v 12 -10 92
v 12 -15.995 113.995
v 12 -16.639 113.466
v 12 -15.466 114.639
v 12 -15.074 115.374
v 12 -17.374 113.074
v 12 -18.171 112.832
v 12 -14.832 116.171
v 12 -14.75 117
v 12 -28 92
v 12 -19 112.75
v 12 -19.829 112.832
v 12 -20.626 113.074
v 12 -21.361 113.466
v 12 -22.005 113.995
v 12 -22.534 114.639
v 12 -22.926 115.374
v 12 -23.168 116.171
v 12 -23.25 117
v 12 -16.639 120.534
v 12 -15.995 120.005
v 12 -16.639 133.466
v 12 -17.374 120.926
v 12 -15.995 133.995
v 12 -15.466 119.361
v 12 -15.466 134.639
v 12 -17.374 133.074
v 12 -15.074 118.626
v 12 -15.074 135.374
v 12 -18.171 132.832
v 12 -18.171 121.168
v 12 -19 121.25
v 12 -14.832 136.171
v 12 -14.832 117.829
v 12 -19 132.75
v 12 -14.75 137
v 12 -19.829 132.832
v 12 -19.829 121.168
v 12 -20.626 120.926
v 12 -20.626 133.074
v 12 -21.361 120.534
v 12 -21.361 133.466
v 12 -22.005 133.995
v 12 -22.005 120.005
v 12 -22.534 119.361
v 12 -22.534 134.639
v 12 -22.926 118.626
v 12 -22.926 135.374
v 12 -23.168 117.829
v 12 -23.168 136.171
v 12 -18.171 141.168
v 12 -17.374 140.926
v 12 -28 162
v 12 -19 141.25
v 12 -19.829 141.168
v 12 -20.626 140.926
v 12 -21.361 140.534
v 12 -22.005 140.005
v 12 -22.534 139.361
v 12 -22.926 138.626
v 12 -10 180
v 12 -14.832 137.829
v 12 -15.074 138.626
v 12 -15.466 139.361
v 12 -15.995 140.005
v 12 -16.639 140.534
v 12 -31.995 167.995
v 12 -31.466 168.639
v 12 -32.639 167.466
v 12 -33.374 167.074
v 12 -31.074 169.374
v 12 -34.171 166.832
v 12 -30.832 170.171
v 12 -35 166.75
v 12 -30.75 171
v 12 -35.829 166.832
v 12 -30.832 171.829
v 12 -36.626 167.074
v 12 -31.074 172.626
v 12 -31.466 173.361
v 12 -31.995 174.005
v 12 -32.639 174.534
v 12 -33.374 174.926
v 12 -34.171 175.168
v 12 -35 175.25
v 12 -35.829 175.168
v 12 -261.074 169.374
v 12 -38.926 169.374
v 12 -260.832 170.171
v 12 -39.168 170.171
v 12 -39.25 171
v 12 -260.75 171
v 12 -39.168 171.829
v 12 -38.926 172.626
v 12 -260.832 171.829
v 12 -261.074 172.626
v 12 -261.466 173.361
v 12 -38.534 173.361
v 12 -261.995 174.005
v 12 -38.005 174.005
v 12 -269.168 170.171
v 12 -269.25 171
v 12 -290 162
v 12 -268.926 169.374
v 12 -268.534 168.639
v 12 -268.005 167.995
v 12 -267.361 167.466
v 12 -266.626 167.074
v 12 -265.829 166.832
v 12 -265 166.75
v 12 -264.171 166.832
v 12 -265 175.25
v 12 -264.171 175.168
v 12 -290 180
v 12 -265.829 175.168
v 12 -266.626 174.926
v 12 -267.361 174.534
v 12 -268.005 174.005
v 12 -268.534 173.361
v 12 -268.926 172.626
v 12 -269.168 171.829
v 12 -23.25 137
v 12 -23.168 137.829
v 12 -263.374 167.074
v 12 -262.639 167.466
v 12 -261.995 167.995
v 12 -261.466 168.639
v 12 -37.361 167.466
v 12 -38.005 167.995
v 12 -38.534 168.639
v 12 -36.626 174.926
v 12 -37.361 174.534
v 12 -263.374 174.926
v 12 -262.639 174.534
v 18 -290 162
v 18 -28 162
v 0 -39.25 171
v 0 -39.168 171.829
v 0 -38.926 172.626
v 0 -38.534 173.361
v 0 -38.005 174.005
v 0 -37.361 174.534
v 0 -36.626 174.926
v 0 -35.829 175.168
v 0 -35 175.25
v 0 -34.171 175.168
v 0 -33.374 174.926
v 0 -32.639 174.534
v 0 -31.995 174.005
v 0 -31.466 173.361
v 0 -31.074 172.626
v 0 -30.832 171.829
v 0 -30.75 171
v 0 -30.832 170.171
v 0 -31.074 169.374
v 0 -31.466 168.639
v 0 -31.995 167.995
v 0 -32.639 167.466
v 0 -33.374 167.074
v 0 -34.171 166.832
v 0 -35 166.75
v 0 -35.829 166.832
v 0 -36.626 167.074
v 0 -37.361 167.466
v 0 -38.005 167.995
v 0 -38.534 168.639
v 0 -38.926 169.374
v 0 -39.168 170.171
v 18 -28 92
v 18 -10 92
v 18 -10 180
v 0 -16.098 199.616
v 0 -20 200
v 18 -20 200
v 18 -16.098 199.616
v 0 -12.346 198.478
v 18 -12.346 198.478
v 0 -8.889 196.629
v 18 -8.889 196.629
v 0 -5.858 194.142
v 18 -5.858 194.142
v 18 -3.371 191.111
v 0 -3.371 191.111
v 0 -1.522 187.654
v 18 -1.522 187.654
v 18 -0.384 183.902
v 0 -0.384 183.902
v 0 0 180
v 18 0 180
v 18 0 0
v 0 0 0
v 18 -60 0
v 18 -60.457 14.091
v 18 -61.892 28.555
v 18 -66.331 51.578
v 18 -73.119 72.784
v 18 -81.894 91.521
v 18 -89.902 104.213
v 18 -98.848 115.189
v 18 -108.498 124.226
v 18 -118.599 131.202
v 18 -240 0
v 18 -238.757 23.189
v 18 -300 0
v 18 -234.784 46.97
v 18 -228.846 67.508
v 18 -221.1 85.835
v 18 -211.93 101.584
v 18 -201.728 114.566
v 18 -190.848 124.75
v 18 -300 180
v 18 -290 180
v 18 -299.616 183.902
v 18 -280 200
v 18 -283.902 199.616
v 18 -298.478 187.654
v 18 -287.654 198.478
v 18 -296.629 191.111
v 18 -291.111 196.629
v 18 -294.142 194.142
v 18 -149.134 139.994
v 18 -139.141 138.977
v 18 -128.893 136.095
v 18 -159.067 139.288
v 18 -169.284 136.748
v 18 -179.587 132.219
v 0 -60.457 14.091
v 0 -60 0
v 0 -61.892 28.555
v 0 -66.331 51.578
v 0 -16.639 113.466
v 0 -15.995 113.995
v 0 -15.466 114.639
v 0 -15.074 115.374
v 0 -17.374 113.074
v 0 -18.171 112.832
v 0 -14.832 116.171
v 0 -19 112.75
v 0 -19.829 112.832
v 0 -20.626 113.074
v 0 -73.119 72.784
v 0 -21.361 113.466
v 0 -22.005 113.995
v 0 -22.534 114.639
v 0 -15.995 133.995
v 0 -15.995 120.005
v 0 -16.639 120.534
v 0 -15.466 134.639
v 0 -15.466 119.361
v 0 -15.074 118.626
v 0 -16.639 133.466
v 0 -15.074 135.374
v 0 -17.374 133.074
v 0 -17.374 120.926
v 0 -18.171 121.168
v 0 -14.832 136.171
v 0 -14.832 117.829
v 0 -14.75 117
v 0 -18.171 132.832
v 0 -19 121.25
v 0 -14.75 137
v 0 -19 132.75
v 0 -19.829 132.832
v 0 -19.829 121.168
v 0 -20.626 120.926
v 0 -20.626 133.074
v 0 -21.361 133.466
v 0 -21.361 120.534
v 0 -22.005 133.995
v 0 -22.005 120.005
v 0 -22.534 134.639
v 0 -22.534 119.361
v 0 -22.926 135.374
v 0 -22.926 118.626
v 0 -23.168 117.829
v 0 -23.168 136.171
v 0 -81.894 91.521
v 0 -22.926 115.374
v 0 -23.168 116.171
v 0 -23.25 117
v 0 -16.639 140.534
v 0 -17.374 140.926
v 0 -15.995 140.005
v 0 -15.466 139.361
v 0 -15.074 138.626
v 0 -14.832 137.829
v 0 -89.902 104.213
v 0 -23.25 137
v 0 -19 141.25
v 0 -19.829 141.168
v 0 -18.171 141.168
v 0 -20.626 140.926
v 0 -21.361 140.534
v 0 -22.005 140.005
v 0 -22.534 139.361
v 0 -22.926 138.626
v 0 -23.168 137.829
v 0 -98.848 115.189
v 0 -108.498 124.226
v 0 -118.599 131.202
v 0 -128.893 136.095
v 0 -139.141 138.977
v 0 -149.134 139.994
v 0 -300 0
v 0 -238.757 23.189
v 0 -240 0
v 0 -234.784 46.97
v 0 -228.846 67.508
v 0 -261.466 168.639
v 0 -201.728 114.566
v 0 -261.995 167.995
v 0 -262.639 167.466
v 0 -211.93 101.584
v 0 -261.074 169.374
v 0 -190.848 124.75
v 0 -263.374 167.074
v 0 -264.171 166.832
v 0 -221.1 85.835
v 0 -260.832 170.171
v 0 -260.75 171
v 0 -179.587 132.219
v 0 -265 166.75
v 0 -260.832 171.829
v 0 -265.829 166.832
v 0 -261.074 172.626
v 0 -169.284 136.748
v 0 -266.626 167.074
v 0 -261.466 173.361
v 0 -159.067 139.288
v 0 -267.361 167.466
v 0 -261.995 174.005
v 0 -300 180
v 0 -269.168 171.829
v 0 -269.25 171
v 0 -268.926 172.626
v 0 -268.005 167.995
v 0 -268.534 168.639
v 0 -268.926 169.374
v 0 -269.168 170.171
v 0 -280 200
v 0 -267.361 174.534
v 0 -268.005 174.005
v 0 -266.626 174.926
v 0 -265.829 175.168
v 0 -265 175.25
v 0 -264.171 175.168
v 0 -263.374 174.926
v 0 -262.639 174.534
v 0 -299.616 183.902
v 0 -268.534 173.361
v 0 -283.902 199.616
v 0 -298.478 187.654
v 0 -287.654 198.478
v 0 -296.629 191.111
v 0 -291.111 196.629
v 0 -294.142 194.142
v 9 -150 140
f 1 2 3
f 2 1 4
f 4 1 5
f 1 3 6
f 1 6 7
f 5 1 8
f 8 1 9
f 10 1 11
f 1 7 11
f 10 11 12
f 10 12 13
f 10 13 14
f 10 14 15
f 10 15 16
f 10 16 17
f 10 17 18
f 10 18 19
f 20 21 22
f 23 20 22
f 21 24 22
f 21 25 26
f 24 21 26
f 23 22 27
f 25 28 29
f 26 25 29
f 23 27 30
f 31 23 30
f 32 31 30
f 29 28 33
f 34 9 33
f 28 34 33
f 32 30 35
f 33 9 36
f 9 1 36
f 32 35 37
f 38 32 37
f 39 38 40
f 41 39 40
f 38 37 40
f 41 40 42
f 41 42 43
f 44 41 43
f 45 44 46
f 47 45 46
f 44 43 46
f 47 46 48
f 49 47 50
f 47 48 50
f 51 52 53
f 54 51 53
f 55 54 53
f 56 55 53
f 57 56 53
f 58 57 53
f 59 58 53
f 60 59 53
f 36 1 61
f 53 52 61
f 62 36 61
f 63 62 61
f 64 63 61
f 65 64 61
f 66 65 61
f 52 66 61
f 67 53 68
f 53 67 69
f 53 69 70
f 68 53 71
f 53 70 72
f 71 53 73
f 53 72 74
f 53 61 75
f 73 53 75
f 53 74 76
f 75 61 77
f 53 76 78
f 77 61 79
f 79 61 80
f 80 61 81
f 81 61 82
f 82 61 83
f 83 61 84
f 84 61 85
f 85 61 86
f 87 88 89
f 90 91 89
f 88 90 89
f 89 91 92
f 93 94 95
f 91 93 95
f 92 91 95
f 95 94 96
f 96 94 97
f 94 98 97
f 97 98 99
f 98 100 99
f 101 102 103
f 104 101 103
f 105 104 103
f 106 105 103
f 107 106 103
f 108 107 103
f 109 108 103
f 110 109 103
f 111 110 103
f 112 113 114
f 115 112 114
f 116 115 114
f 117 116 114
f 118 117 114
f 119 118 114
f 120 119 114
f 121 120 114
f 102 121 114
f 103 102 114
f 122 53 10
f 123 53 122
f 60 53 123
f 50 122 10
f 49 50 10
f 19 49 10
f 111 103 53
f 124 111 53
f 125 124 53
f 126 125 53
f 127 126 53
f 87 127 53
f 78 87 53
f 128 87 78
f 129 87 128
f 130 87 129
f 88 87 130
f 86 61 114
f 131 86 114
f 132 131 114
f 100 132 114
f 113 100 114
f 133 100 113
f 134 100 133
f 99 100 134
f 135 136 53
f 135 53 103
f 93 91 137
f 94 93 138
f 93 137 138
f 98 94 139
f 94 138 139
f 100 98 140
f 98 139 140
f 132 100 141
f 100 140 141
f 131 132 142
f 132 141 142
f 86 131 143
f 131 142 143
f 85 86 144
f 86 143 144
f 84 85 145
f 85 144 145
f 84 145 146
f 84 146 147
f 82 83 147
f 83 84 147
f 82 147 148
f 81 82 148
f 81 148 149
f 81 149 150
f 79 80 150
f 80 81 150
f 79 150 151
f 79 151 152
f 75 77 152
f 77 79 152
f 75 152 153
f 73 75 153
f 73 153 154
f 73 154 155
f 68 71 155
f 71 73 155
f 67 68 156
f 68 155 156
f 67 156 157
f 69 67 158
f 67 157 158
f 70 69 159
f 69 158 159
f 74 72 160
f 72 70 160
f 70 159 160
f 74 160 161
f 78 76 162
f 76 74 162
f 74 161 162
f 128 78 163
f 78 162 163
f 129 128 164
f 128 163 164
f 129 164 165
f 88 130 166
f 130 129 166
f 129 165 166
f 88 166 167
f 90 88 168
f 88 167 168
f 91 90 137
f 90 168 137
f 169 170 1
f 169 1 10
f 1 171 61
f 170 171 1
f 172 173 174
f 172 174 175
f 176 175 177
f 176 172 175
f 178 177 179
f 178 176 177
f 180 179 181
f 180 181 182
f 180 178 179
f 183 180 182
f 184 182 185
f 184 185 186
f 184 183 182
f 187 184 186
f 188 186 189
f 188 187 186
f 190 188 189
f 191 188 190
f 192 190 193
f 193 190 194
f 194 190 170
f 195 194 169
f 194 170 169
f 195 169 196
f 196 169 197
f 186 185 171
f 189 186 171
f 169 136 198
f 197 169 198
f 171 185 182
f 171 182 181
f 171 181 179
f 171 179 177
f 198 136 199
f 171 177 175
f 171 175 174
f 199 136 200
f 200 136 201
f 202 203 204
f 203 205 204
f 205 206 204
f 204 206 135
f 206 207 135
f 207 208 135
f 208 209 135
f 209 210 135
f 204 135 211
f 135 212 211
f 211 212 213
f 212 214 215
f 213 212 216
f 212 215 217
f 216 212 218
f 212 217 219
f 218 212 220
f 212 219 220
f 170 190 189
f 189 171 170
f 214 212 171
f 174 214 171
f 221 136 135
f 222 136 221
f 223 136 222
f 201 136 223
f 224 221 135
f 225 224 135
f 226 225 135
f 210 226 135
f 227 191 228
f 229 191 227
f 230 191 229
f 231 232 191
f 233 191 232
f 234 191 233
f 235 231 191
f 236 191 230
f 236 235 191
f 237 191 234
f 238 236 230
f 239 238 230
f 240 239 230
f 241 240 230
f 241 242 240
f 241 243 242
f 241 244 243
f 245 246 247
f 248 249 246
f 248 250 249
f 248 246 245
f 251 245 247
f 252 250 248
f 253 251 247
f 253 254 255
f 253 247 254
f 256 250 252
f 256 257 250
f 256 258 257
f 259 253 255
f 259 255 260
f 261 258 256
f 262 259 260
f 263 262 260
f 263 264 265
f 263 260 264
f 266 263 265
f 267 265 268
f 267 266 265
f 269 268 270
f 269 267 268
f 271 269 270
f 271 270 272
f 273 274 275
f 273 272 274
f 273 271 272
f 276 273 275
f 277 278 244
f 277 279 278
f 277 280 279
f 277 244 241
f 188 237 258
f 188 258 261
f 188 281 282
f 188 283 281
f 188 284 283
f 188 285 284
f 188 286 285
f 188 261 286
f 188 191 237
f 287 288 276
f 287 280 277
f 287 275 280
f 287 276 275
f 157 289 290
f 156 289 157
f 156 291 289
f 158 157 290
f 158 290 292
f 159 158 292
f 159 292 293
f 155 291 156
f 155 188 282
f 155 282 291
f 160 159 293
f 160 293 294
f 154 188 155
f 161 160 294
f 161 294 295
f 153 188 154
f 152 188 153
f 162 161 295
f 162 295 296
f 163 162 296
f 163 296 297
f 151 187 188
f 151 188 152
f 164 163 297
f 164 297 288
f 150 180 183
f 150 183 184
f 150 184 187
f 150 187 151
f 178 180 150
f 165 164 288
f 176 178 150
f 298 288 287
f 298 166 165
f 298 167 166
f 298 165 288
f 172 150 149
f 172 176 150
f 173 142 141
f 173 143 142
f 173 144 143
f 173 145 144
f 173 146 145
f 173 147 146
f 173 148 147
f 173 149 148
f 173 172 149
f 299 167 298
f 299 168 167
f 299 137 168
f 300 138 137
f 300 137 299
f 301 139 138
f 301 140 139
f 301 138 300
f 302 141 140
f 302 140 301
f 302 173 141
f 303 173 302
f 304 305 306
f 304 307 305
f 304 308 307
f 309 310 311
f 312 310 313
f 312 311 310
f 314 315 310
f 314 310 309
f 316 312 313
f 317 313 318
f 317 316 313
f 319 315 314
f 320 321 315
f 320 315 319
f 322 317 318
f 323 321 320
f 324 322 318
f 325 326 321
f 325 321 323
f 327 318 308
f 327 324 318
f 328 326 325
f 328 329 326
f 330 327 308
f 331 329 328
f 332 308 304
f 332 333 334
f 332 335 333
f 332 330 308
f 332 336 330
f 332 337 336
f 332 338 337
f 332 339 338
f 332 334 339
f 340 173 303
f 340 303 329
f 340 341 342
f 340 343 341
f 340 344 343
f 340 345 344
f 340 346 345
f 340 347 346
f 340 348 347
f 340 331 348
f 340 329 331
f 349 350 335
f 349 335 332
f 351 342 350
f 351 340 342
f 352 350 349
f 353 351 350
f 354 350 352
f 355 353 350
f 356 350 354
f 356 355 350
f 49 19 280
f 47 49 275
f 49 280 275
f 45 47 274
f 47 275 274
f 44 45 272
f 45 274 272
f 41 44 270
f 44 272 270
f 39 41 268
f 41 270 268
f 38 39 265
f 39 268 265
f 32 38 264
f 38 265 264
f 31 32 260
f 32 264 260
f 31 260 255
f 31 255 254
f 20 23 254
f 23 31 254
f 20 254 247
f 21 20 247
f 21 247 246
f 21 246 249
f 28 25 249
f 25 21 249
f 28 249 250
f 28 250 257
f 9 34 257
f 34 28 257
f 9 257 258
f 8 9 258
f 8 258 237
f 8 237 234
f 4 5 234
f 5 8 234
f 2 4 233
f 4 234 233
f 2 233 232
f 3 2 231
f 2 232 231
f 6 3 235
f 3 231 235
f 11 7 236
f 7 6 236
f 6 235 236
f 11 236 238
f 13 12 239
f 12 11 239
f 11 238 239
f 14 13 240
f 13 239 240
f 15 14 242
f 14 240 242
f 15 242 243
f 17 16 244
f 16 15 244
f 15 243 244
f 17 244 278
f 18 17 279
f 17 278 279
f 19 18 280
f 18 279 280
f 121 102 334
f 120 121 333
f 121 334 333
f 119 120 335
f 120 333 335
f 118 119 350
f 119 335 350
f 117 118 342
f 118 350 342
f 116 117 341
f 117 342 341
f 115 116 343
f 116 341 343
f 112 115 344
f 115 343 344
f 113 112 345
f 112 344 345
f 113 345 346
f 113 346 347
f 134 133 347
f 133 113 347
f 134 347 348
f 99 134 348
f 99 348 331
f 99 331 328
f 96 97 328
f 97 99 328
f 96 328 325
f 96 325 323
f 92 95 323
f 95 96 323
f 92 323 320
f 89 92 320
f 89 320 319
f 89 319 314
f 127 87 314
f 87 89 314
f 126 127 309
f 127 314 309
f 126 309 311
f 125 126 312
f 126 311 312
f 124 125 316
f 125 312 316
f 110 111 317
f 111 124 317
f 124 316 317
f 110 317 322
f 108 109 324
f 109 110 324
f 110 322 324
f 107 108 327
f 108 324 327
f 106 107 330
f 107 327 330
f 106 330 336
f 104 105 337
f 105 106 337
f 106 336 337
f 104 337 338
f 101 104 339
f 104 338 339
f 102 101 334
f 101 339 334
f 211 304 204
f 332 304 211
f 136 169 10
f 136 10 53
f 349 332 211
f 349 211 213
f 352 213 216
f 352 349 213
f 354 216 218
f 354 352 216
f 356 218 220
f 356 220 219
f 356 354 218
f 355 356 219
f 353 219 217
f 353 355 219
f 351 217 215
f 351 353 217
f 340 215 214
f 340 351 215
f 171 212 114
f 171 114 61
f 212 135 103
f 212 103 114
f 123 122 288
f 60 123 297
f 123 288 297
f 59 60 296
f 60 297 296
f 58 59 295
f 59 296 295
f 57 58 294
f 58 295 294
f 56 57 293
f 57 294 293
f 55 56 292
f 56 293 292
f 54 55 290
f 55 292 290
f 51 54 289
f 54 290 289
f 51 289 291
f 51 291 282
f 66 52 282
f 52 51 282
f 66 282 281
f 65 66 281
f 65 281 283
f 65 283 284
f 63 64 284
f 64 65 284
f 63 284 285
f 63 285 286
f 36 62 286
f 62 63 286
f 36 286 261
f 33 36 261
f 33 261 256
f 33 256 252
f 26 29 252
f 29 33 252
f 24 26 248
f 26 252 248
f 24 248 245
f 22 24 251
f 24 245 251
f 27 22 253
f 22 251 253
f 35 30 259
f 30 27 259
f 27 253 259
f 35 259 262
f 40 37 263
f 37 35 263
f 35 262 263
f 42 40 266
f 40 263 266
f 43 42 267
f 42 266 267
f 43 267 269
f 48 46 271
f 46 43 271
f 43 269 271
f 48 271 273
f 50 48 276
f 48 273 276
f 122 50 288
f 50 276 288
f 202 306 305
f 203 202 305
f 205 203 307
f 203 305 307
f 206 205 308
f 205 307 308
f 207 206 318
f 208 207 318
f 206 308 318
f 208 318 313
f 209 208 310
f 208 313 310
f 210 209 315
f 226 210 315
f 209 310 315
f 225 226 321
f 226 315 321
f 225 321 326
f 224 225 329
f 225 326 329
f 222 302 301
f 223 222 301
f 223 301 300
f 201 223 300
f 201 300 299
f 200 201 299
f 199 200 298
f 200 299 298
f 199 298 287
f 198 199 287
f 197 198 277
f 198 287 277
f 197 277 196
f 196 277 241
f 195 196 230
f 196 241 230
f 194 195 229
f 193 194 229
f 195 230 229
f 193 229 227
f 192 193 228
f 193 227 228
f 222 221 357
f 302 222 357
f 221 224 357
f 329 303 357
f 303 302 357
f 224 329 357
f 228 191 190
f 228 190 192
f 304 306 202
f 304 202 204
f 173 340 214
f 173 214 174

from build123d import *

# Parameters (mm, degrees)
PAD_DEPTH            = 18
POCKET_DEPTH         = 6
SKETCH002_R          = 4.25
POCKET001_DEPTH      = 0.001
POCKET001_DEPTH_BACK = 18.001


with BuildPart() as body:
    # Sketch → Pad (new body)
    with BuildSketch(Plane.YZ):
        with BuildLine():
            ThreePointArc((20, 200), (5.857864, 194.142136), (0, 180))
            Line((0, 180), (0, 0))
            Line((0, 0), (60, 0))
            add(Edge.make_bspline(
                [(240, 0), (240, 140), (150, 140), (60, 140), (60, 0)],
                knots=[1.570796, 1.570796, 1.570796, 3.141593, 3.141593, 4.712389, 4.712389, 4.712389], degree=2, weights=[1, 0.707107, 1, 0.707107, 1]))
            Line((240, 0), (300, 0))
            Line((300, 0), (300, 180))
            ThreePointArc((300, 180), (294.142136, 194.142136), (280, 200))
            Line((280, 200), (225, 200))
            Line((225, 200), (75, 200))
            Line((75, 200), (20, 200))
        make_face()
    extrude(amount=PAD_DEPTH)

    # Sketch001 → Pocket (cut)
    with BuildSketch(Plane.YZ.offset(18)):
        Polygon((28, 92), (28, 162), (290, 162), (290, 180), (10, 180), (10, 92), align=None)
    extrude(amount=-POCKET_DEPTH, mode=Mode.SUBTRACT)

    # Sketch002 → Pocket001 (cut, two sides)
    with BuildSketch(Plane.YZ) as pocket001_sk:
        with Locations((19, 137)):
            Circle(SKETCH002_R)
        with Locations((19, 117)):
            Circle(SKETCH002_R)
        with Locations((35, 171)):
            Circle(SKETCH002_R)
        with Locations((265, 171)):
            Circle(SKETCH002_R)
    extrude(amount=-POCKET001_DEPTH, mode=Mode.SUBTRACT)
    extrude(pocket001_sk.sketch, amount=POCKET001_DEPTH_BACK, mode=Mode.SUBTRACT)


with BuildPart() as part_mirroring:
    # Part__Mirroring: instance of Body
    add(body.part.mirror(Plane(origin=(0, 0, 0), x_dir=(1, 0, 0), z_dir=(0, 1, 0))))


solid = part_mirroring.part
